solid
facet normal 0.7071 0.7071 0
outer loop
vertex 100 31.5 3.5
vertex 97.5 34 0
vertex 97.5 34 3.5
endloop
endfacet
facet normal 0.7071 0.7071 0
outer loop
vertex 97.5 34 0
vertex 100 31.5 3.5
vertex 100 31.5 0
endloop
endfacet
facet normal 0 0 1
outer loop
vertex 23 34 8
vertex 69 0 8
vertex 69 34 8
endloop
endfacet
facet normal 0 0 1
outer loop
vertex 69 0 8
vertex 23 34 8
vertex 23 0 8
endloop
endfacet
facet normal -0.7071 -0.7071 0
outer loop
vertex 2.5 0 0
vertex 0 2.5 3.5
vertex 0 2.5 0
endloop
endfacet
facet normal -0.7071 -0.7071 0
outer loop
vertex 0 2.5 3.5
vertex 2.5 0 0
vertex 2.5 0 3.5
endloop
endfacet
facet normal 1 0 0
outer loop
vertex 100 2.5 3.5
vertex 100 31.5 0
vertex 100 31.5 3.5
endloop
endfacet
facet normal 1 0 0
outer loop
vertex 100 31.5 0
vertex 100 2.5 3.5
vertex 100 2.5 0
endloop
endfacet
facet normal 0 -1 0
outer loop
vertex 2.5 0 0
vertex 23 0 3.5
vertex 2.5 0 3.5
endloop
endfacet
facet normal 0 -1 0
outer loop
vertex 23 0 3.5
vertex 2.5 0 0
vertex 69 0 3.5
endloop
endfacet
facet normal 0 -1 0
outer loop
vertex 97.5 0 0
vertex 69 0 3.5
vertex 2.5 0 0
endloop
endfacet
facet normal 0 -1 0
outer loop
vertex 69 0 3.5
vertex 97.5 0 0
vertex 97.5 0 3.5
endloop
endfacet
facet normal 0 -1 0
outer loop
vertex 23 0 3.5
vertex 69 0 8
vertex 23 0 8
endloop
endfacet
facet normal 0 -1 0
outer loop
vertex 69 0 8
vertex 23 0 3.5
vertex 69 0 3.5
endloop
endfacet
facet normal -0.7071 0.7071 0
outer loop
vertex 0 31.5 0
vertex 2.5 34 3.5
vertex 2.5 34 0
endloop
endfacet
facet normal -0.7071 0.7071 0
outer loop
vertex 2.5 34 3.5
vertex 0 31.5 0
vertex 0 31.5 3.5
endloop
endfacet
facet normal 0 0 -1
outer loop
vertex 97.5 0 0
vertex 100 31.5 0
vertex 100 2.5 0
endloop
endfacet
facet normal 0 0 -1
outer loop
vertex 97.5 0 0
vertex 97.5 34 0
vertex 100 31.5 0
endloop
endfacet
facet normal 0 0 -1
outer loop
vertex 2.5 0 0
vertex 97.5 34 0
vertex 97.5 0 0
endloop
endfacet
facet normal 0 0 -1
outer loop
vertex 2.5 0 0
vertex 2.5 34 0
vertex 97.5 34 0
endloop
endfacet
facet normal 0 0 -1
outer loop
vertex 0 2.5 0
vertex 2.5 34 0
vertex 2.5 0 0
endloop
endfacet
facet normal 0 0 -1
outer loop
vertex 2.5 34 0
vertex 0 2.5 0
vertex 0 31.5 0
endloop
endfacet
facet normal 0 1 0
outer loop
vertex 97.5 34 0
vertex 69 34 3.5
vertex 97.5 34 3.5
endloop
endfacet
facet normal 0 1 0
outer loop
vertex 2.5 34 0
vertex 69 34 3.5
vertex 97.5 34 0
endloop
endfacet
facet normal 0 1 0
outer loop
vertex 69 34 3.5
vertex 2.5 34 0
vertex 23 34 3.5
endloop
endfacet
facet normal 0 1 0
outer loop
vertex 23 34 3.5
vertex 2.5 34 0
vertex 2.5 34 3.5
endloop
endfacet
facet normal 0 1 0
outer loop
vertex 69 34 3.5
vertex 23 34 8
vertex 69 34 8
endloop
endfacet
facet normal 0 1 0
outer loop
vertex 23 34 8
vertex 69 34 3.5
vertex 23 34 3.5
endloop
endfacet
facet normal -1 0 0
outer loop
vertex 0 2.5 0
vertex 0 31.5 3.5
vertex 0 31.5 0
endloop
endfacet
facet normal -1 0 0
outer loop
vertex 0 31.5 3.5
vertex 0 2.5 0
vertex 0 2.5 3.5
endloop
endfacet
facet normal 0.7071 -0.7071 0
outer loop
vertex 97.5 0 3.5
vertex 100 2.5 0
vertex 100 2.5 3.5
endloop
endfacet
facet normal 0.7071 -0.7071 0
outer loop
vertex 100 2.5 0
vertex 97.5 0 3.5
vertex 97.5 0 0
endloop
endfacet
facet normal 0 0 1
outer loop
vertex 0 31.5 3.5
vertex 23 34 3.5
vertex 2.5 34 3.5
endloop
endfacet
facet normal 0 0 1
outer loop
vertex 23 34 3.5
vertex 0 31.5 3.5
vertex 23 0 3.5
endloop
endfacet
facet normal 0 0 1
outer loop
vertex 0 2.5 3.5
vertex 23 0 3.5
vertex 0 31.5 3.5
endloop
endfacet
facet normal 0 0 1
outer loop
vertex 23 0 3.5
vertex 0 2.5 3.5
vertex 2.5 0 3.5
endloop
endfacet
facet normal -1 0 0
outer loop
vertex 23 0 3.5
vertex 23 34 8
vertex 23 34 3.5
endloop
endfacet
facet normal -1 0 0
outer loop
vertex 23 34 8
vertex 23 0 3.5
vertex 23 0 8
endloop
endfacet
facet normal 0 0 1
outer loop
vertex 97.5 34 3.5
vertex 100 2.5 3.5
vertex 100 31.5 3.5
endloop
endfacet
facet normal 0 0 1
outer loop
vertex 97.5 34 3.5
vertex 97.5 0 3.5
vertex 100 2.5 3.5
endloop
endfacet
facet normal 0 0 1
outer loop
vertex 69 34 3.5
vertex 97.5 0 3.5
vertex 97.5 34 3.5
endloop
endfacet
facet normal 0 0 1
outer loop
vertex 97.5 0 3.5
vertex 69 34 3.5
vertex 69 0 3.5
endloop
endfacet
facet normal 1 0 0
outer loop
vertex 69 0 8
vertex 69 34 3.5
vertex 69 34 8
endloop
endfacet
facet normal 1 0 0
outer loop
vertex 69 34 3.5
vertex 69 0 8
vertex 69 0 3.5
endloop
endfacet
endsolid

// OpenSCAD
$fn = 32;

// ----------------------------------------------------------------------
// Stepped bar: centerstep, 100 x 34 x 8/3.5 mm
// ----------------------------------------------------------------------

// --- parameters (mm) ---
bar_l = 100;              // bar length, X
bar_w = 34;               // bar width, Y
plate_t = 8;              // thickness of the thick zone, Z
thin_t = 3.5;             // thickness of the thin zone
corner_c = 2.5;           // corner chamfer of the bar
step_cut = 4.5;           // material removed from the thin zone
thick_from = 23;          // start of the thick middle zone
thick_to = 69;            // end of the thick middle zone
depth_1 = 4.5;            // depth of cut 1 from the top face
depth_2 = 4.5;            // depth of cut 2 from the top face

profile = [[2.5, 0], [97.5, 0], [100, 2.5], [100, 31.5], [97.5, 34], [2.5, 34], [0, 31.5], [0, 2.5]];  // primary outline, 8 points, counter clockwise
void_1 = [[-1, -1], [23, -1], [23, 35], [-1, 35]];  // thin left end, 4 points
void_2 = [[69, -1], [101, -1], [101, 35], [69, 35]];  // thin right end, 4 points

// --- the one profile operation ---
difference() {
  linear_extrude(height = plate_t) polygon(points = profile);
  translate([0, 0, plate_t - depth_1])
    linear_extrude(height = depth_1 + 1) polygon(points = void_1);
  translate([0, 0, plate_t - depth_2])
    linear_extrude(height = depth_2 + 1) polygon(points = void_2);
}
